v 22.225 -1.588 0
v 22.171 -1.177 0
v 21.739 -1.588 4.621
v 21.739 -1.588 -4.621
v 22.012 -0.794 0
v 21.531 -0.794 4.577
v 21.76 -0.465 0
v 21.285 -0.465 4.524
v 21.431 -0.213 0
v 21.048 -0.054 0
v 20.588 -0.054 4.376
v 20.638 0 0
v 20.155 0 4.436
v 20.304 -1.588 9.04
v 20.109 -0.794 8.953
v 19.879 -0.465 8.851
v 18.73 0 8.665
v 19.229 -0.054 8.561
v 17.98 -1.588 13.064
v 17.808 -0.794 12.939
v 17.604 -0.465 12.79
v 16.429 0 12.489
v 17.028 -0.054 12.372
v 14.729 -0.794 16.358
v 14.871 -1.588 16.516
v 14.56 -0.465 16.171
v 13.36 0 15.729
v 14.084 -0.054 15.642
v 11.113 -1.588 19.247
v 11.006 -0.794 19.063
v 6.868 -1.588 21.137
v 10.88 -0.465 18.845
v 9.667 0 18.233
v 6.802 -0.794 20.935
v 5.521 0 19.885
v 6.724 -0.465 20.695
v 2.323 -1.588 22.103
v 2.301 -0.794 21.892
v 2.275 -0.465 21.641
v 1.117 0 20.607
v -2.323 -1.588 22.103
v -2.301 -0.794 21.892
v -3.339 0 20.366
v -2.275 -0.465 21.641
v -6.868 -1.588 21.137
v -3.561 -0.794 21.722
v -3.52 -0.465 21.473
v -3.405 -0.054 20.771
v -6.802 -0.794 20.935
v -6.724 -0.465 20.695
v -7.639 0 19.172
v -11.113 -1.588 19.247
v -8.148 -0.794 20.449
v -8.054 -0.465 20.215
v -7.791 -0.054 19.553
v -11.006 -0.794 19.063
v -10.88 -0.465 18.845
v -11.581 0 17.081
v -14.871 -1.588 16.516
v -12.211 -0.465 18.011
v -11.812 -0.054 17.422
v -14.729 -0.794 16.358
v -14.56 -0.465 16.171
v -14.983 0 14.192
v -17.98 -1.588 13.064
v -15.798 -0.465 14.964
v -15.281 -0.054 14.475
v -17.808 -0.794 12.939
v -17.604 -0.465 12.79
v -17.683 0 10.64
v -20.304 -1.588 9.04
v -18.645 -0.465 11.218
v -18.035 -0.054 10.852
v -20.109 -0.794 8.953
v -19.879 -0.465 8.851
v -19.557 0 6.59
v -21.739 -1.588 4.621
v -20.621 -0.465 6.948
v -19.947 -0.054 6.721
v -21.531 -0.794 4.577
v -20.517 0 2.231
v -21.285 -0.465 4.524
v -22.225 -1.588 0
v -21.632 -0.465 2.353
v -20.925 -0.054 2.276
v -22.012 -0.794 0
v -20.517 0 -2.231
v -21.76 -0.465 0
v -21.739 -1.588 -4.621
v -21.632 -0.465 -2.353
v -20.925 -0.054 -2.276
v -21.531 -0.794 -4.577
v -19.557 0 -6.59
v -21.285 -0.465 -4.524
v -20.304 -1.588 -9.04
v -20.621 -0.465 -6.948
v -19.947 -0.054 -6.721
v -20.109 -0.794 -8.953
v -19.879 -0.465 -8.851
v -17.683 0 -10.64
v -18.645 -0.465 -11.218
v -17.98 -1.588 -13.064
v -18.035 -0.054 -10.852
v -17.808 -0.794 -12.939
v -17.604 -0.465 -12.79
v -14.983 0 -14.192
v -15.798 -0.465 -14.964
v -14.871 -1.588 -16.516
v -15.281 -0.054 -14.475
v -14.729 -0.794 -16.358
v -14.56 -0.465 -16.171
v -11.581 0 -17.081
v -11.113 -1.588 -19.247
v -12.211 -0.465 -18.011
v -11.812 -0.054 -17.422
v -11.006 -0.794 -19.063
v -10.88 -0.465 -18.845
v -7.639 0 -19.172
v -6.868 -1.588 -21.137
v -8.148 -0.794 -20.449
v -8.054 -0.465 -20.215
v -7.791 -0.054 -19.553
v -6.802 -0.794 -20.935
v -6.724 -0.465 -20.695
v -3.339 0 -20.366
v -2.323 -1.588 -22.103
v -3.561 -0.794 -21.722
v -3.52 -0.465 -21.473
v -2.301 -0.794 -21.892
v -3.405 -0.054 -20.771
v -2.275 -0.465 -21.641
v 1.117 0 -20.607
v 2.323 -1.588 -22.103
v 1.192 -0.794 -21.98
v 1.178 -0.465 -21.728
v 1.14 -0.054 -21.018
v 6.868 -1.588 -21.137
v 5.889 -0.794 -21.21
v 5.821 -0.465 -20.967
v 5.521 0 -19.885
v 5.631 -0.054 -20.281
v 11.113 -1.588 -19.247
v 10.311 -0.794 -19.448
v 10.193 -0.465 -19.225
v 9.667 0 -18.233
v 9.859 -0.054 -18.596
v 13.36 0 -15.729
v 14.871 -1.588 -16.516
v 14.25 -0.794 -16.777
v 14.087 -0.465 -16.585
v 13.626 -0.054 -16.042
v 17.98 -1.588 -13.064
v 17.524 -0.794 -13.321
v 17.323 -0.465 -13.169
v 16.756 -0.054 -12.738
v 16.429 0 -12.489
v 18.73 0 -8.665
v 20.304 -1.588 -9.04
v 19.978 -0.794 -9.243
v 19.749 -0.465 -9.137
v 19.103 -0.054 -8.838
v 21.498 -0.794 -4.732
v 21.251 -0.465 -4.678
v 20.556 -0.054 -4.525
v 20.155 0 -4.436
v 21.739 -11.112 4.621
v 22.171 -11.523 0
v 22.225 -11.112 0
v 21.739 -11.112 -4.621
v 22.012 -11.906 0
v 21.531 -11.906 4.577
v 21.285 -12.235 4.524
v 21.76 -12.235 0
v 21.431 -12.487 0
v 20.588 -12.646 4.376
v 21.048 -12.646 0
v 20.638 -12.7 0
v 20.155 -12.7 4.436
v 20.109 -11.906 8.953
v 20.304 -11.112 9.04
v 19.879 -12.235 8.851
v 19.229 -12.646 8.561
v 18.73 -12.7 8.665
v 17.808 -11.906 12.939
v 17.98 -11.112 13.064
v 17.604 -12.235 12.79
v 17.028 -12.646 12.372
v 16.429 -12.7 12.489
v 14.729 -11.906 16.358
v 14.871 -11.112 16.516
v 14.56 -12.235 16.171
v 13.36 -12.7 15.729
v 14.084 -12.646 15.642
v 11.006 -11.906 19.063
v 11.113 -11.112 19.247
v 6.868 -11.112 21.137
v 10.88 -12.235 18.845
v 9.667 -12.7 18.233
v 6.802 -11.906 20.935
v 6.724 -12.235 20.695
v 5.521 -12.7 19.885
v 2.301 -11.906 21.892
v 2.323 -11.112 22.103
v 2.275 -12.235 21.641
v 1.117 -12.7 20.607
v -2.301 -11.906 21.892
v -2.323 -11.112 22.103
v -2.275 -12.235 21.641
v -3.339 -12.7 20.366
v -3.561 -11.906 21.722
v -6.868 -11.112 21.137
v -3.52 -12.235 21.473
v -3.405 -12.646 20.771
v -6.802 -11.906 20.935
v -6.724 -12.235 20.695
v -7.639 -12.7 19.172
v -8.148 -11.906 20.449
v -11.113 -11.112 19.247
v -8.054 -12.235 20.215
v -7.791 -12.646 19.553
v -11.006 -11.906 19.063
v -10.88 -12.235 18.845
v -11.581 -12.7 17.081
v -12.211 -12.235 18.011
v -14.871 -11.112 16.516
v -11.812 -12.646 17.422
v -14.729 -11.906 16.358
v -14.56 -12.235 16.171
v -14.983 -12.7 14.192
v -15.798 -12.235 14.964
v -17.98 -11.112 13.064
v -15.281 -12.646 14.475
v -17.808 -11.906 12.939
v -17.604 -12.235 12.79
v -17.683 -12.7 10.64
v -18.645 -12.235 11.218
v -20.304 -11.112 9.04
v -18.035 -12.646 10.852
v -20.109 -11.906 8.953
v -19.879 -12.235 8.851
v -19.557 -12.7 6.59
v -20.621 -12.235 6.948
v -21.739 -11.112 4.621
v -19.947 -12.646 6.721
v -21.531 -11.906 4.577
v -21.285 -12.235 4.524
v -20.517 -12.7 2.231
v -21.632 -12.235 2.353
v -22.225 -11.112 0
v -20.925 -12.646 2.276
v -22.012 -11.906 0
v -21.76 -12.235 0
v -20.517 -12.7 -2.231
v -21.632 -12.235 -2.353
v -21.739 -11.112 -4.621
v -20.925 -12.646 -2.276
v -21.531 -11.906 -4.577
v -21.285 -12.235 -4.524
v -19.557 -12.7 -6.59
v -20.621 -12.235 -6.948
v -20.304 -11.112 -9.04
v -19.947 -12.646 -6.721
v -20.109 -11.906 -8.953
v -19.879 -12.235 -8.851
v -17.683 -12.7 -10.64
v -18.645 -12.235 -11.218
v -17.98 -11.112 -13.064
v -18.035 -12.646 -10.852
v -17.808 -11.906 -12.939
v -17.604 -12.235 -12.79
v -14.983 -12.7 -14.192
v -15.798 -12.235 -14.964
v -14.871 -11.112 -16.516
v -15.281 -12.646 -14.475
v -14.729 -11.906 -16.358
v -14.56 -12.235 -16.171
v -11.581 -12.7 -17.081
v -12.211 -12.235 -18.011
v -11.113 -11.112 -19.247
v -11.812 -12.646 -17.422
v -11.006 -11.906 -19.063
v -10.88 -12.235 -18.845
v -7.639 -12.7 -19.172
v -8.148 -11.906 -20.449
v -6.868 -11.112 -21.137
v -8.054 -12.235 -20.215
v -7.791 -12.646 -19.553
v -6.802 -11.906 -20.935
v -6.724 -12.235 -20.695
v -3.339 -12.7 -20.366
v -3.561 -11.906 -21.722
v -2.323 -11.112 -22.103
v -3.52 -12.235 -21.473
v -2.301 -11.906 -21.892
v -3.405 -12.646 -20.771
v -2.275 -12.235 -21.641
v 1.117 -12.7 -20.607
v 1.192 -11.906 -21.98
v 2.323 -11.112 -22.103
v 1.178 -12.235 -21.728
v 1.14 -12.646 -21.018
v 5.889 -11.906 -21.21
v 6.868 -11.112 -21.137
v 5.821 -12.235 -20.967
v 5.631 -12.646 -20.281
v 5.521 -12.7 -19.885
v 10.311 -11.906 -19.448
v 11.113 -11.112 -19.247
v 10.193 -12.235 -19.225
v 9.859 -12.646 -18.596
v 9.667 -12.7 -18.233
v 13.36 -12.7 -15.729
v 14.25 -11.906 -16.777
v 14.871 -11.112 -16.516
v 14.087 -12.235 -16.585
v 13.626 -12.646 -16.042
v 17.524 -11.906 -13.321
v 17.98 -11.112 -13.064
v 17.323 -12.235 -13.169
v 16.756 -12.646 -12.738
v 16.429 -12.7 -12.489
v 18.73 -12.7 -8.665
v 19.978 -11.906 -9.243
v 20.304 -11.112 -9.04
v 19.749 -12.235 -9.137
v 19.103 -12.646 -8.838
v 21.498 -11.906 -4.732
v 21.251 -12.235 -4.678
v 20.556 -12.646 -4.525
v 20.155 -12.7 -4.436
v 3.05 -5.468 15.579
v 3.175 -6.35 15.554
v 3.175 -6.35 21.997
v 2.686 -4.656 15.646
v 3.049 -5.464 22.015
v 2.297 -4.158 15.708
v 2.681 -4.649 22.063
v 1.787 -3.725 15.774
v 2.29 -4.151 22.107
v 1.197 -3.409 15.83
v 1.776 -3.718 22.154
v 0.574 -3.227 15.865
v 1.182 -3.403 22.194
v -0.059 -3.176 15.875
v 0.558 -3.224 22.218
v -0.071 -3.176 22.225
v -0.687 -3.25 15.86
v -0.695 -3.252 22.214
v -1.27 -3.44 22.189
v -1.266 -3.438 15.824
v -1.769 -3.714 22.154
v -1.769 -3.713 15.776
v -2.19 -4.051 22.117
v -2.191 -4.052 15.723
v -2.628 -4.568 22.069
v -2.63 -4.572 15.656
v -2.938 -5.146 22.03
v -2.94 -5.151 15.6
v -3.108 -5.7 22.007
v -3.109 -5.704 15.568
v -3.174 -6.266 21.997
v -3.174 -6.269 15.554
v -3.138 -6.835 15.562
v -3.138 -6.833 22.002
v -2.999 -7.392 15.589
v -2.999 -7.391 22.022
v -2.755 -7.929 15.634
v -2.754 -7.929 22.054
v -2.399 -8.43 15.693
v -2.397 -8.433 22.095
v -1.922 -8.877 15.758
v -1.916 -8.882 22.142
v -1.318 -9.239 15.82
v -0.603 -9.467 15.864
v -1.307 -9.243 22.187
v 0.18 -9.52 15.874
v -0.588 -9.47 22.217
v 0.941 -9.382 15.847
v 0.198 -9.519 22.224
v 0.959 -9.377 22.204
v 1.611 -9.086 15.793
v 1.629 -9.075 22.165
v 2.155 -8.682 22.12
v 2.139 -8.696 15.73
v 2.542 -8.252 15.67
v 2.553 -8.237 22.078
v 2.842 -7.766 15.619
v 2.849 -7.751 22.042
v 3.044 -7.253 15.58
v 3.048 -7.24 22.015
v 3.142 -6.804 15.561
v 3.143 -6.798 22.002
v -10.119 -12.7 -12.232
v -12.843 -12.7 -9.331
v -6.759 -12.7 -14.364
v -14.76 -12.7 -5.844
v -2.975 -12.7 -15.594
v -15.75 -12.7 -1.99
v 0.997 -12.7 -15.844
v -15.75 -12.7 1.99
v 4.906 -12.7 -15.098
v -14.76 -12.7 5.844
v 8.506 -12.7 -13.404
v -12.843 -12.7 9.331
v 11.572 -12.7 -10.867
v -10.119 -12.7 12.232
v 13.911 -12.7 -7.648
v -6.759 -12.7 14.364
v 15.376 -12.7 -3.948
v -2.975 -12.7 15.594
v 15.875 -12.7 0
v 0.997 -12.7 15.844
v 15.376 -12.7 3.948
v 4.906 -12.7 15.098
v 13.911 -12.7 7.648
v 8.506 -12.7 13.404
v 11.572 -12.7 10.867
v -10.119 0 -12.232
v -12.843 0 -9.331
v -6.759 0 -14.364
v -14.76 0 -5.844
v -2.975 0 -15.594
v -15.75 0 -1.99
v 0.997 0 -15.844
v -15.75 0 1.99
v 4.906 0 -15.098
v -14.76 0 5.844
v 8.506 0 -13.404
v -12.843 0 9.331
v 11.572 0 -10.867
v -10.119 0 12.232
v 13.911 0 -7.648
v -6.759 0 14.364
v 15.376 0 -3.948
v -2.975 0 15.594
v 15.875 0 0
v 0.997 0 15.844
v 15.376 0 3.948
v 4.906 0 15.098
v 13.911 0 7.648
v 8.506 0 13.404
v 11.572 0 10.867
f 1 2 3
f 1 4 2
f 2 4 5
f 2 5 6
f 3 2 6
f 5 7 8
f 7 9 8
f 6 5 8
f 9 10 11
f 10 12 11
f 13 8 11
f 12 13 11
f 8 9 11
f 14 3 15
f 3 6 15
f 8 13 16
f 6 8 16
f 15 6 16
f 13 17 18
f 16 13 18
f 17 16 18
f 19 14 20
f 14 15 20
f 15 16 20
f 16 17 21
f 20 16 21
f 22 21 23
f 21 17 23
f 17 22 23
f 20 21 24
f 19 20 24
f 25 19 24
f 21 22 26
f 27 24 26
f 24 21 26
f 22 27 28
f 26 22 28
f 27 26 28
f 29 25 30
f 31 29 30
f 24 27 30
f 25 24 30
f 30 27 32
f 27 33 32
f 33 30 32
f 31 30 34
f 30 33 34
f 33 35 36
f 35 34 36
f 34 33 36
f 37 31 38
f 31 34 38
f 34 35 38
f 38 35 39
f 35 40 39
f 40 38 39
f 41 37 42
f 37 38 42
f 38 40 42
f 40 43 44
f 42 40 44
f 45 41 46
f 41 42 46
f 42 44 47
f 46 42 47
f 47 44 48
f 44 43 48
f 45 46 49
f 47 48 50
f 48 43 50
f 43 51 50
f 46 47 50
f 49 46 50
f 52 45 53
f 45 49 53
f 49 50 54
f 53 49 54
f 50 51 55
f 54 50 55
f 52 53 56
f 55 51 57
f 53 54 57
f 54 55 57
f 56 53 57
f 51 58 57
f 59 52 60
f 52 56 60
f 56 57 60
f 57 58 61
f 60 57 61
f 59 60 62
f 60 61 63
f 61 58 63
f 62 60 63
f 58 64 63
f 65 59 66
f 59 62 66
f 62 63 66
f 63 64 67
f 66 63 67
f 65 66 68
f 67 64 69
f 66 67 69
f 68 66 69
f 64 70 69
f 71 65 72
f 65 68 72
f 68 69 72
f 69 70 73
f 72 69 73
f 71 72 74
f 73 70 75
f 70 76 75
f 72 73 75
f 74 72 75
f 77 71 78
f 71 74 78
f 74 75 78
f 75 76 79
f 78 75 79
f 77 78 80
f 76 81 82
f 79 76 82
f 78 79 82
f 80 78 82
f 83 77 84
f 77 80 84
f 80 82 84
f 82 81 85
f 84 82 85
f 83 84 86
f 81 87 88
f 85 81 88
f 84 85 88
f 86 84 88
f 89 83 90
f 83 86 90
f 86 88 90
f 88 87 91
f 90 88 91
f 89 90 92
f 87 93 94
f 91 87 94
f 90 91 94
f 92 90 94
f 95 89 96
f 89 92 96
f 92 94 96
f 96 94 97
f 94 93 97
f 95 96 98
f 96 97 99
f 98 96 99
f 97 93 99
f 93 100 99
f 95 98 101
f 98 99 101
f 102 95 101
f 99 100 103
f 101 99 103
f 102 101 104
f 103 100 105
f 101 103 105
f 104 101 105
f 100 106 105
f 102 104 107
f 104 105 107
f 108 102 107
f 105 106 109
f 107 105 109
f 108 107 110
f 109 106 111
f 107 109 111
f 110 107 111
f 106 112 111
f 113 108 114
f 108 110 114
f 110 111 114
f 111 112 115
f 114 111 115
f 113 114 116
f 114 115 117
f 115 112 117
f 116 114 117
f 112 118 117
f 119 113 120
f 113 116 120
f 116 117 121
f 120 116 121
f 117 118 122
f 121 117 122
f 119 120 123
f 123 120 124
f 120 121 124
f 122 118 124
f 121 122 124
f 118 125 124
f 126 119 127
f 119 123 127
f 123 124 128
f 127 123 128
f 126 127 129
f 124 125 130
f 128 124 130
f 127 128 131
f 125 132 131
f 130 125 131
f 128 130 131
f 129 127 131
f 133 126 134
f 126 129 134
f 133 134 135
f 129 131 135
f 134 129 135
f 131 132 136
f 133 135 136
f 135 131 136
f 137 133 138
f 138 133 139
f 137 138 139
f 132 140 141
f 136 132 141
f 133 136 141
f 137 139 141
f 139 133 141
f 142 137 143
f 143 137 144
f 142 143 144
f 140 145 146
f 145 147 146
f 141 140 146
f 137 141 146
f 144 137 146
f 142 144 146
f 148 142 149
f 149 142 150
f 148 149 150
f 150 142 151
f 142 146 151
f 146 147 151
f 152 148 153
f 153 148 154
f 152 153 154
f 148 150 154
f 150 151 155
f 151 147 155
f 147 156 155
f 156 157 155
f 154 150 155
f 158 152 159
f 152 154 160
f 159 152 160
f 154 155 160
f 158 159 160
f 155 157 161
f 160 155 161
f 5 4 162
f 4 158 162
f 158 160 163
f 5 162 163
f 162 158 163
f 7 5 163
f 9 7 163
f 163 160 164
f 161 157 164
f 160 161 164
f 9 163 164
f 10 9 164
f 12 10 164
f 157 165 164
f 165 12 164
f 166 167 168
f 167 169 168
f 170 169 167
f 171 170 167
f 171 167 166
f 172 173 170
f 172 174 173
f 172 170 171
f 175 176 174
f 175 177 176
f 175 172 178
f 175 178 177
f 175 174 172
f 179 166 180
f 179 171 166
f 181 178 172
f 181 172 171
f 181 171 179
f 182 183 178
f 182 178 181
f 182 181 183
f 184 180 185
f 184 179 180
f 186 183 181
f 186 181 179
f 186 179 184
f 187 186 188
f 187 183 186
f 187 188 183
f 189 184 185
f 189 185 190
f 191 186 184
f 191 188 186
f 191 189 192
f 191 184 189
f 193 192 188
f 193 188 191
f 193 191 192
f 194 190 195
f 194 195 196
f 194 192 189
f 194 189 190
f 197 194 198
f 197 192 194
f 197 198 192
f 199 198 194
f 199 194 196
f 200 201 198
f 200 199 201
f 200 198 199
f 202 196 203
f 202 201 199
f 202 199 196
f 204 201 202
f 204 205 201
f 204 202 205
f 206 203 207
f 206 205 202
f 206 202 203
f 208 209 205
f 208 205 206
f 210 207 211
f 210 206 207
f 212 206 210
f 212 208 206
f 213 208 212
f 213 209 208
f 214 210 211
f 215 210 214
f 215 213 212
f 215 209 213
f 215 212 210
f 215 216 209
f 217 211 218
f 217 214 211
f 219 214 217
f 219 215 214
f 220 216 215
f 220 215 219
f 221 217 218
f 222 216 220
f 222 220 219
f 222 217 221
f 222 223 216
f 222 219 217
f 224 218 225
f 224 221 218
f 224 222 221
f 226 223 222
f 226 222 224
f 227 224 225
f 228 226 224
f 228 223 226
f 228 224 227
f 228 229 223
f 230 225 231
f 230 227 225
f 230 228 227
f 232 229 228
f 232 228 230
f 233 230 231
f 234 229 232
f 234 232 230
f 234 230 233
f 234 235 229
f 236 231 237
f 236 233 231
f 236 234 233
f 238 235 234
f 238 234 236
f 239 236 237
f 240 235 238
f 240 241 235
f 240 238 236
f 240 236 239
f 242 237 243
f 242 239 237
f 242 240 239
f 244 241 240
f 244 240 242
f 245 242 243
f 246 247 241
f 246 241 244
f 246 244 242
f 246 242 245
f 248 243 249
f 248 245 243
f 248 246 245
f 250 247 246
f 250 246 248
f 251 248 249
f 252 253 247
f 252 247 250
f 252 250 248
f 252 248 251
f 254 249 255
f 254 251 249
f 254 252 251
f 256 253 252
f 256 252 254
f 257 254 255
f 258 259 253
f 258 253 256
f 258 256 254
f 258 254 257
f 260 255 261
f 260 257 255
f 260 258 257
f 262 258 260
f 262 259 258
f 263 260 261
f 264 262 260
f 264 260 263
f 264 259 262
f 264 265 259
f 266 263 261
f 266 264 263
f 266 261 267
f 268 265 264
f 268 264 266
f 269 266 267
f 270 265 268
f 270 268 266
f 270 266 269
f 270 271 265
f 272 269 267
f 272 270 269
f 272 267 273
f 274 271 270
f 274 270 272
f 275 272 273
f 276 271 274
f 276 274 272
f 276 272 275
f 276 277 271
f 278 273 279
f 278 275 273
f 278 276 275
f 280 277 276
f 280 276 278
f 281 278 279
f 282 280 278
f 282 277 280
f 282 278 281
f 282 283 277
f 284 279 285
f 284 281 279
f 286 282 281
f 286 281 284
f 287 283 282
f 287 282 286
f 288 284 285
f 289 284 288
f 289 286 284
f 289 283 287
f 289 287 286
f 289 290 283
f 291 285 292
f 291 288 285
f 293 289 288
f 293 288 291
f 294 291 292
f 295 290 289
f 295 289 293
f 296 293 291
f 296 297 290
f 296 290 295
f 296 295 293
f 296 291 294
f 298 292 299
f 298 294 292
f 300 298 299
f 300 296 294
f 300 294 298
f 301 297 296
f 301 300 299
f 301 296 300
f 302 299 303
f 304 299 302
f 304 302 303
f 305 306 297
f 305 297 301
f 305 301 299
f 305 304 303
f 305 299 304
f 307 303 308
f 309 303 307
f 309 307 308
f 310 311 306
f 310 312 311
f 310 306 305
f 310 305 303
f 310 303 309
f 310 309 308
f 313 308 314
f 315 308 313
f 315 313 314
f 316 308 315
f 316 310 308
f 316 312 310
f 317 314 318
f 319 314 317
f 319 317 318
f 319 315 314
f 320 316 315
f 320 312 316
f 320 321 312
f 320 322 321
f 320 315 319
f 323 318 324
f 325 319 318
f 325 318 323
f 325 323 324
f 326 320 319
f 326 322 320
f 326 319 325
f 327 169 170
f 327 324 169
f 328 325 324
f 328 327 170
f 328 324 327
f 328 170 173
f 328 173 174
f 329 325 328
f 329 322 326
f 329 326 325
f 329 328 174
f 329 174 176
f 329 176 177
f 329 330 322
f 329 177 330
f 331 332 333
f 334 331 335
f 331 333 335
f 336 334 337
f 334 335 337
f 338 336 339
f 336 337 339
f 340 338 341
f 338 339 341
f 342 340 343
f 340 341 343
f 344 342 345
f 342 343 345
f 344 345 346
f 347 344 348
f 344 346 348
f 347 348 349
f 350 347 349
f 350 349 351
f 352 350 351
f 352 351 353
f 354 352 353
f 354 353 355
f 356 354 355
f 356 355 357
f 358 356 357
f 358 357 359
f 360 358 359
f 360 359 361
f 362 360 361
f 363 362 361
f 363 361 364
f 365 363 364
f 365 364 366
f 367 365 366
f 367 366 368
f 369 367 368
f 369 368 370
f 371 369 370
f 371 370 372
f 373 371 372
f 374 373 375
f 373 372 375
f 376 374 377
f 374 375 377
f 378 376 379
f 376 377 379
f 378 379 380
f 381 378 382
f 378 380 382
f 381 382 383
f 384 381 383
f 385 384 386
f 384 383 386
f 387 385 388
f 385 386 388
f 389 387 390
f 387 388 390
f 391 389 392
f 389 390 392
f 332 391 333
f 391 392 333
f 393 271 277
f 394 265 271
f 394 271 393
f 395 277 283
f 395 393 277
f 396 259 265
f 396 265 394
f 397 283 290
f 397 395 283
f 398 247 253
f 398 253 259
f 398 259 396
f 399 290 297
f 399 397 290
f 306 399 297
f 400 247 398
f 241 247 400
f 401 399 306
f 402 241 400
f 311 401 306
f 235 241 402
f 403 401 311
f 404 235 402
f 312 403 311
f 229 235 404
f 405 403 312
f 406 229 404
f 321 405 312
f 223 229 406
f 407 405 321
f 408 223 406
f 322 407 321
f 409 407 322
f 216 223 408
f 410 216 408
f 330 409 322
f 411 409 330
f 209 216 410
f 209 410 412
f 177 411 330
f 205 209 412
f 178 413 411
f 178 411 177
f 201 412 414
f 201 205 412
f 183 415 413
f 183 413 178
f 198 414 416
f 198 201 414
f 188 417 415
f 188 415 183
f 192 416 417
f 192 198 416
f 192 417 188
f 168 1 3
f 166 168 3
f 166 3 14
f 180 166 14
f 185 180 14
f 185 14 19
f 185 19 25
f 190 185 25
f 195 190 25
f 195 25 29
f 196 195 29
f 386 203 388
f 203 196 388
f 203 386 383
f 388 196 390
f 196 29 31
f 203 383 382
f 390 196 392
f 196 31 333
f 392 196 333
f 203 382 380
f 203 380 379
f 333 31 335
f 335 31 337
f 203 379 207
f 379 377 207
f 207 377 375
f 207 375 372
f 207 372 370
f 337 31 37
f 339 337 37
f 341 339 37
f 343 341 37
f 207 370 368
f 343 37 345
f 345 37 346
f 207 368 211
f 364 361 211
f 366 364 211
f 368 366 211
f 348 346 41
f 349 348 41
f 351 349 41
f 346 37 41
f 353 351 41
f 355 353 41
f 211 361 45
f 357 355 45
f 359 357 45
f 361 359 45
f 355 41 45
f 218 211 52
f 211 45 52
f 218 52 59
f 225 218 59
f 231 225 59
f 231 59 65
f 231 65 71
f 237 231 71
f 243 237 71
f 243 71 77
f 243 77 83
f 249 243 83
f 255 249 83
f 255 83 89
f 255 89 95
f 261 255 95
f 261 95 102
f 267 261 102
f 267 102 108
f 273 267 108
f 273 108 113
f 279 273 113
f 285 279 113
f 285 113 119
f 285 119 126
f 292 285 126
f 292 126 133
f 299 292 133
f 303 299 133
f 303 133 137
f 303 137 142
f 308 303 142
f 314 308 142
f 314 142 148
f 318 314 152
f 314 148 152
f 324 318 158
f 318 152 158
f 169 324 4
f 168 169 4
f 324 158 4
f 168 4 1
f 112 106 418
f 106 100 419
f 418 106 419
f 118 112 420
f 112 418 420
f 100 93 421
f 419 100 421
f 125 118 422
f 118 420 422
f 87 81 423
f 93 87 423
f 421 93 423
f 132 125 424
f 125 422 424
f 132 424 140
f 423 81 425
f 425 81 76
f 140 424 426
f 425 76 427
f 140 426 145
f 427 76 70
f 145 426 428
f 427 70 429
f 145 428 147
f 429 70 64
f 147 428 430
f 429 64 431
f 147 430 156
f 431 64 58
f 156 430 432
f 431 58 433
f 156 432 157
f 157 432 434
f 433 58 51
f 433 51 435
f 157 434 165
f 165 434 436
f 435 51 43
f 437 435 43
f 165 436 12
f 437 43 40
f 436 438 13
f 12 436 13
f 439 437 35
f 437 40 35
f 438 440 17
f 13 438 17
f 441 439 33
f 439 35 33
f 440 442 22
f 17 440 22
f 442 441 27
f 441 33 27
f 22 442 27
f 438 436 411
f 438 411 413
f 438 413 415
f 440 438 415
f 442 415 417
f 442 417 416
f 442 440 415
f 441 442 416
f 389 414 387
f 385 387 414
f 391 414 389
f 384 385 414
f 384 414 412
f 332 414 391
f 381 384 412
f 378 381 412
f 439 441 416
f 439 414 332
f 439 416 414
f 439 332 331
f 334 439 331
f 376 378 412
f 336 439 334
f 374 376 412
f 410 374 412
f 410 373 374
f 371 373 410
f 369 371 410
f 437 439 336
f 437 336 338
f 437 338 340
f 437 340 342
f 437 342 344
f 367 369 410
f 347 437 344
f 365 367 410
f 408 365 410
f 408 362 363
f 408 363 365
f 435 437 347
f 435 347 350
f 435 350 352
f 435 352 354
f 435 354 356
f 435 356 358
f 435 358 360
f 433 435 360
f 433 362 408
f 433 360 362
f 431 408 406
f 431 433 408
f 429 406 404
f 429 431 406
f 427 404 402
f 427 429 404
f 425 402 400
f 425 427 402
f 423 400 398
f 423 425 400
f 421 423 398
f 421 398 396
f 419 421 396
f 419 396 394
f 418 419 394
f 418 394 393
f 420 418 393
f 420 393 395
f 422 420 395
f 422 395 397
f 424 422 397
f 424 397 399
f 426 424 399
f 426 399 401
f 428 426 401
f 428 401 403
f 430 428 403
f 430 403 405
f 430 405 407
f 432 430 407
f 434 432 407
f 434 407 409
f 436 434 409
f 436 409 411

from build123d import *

# Parameters (mm, degrees)
F0_R     = 22.225
F0_R_2   = 15.875
F1_DEPTH = 12.7
F3_R     = 3.175
F4_DEPTH = 12.7
F5_R     = 1.5875


with BuildPart() as f1:
    # F0 (on Front) → F1 (new body)
    with BuildSketch(Plane.XZ):
        Circle(F0_R)
        Circle(F0_R_2, mode=Mode.SUBTRACT)
    extrude(amount=F1_DEPTH)

    # F3 (on offset) → F4 (cut)
    with BuildSketch(Plane.XY.offset(23.368)):
        with Locations((0, -6.35)):
            Circle(F3_R)
    extrude(amount=-F4_DEPTH, mode=Mode.SUBTRACT)

    # F5
    f5_edges = [f1.edges().sort_by_distance(p)[0] for p in [
        (-22.225, -12.7, 0),
        (-22.225, 0, 0),
    ]]
    fillet(f5_edges, radius=F5_R)


solid = f1.part
